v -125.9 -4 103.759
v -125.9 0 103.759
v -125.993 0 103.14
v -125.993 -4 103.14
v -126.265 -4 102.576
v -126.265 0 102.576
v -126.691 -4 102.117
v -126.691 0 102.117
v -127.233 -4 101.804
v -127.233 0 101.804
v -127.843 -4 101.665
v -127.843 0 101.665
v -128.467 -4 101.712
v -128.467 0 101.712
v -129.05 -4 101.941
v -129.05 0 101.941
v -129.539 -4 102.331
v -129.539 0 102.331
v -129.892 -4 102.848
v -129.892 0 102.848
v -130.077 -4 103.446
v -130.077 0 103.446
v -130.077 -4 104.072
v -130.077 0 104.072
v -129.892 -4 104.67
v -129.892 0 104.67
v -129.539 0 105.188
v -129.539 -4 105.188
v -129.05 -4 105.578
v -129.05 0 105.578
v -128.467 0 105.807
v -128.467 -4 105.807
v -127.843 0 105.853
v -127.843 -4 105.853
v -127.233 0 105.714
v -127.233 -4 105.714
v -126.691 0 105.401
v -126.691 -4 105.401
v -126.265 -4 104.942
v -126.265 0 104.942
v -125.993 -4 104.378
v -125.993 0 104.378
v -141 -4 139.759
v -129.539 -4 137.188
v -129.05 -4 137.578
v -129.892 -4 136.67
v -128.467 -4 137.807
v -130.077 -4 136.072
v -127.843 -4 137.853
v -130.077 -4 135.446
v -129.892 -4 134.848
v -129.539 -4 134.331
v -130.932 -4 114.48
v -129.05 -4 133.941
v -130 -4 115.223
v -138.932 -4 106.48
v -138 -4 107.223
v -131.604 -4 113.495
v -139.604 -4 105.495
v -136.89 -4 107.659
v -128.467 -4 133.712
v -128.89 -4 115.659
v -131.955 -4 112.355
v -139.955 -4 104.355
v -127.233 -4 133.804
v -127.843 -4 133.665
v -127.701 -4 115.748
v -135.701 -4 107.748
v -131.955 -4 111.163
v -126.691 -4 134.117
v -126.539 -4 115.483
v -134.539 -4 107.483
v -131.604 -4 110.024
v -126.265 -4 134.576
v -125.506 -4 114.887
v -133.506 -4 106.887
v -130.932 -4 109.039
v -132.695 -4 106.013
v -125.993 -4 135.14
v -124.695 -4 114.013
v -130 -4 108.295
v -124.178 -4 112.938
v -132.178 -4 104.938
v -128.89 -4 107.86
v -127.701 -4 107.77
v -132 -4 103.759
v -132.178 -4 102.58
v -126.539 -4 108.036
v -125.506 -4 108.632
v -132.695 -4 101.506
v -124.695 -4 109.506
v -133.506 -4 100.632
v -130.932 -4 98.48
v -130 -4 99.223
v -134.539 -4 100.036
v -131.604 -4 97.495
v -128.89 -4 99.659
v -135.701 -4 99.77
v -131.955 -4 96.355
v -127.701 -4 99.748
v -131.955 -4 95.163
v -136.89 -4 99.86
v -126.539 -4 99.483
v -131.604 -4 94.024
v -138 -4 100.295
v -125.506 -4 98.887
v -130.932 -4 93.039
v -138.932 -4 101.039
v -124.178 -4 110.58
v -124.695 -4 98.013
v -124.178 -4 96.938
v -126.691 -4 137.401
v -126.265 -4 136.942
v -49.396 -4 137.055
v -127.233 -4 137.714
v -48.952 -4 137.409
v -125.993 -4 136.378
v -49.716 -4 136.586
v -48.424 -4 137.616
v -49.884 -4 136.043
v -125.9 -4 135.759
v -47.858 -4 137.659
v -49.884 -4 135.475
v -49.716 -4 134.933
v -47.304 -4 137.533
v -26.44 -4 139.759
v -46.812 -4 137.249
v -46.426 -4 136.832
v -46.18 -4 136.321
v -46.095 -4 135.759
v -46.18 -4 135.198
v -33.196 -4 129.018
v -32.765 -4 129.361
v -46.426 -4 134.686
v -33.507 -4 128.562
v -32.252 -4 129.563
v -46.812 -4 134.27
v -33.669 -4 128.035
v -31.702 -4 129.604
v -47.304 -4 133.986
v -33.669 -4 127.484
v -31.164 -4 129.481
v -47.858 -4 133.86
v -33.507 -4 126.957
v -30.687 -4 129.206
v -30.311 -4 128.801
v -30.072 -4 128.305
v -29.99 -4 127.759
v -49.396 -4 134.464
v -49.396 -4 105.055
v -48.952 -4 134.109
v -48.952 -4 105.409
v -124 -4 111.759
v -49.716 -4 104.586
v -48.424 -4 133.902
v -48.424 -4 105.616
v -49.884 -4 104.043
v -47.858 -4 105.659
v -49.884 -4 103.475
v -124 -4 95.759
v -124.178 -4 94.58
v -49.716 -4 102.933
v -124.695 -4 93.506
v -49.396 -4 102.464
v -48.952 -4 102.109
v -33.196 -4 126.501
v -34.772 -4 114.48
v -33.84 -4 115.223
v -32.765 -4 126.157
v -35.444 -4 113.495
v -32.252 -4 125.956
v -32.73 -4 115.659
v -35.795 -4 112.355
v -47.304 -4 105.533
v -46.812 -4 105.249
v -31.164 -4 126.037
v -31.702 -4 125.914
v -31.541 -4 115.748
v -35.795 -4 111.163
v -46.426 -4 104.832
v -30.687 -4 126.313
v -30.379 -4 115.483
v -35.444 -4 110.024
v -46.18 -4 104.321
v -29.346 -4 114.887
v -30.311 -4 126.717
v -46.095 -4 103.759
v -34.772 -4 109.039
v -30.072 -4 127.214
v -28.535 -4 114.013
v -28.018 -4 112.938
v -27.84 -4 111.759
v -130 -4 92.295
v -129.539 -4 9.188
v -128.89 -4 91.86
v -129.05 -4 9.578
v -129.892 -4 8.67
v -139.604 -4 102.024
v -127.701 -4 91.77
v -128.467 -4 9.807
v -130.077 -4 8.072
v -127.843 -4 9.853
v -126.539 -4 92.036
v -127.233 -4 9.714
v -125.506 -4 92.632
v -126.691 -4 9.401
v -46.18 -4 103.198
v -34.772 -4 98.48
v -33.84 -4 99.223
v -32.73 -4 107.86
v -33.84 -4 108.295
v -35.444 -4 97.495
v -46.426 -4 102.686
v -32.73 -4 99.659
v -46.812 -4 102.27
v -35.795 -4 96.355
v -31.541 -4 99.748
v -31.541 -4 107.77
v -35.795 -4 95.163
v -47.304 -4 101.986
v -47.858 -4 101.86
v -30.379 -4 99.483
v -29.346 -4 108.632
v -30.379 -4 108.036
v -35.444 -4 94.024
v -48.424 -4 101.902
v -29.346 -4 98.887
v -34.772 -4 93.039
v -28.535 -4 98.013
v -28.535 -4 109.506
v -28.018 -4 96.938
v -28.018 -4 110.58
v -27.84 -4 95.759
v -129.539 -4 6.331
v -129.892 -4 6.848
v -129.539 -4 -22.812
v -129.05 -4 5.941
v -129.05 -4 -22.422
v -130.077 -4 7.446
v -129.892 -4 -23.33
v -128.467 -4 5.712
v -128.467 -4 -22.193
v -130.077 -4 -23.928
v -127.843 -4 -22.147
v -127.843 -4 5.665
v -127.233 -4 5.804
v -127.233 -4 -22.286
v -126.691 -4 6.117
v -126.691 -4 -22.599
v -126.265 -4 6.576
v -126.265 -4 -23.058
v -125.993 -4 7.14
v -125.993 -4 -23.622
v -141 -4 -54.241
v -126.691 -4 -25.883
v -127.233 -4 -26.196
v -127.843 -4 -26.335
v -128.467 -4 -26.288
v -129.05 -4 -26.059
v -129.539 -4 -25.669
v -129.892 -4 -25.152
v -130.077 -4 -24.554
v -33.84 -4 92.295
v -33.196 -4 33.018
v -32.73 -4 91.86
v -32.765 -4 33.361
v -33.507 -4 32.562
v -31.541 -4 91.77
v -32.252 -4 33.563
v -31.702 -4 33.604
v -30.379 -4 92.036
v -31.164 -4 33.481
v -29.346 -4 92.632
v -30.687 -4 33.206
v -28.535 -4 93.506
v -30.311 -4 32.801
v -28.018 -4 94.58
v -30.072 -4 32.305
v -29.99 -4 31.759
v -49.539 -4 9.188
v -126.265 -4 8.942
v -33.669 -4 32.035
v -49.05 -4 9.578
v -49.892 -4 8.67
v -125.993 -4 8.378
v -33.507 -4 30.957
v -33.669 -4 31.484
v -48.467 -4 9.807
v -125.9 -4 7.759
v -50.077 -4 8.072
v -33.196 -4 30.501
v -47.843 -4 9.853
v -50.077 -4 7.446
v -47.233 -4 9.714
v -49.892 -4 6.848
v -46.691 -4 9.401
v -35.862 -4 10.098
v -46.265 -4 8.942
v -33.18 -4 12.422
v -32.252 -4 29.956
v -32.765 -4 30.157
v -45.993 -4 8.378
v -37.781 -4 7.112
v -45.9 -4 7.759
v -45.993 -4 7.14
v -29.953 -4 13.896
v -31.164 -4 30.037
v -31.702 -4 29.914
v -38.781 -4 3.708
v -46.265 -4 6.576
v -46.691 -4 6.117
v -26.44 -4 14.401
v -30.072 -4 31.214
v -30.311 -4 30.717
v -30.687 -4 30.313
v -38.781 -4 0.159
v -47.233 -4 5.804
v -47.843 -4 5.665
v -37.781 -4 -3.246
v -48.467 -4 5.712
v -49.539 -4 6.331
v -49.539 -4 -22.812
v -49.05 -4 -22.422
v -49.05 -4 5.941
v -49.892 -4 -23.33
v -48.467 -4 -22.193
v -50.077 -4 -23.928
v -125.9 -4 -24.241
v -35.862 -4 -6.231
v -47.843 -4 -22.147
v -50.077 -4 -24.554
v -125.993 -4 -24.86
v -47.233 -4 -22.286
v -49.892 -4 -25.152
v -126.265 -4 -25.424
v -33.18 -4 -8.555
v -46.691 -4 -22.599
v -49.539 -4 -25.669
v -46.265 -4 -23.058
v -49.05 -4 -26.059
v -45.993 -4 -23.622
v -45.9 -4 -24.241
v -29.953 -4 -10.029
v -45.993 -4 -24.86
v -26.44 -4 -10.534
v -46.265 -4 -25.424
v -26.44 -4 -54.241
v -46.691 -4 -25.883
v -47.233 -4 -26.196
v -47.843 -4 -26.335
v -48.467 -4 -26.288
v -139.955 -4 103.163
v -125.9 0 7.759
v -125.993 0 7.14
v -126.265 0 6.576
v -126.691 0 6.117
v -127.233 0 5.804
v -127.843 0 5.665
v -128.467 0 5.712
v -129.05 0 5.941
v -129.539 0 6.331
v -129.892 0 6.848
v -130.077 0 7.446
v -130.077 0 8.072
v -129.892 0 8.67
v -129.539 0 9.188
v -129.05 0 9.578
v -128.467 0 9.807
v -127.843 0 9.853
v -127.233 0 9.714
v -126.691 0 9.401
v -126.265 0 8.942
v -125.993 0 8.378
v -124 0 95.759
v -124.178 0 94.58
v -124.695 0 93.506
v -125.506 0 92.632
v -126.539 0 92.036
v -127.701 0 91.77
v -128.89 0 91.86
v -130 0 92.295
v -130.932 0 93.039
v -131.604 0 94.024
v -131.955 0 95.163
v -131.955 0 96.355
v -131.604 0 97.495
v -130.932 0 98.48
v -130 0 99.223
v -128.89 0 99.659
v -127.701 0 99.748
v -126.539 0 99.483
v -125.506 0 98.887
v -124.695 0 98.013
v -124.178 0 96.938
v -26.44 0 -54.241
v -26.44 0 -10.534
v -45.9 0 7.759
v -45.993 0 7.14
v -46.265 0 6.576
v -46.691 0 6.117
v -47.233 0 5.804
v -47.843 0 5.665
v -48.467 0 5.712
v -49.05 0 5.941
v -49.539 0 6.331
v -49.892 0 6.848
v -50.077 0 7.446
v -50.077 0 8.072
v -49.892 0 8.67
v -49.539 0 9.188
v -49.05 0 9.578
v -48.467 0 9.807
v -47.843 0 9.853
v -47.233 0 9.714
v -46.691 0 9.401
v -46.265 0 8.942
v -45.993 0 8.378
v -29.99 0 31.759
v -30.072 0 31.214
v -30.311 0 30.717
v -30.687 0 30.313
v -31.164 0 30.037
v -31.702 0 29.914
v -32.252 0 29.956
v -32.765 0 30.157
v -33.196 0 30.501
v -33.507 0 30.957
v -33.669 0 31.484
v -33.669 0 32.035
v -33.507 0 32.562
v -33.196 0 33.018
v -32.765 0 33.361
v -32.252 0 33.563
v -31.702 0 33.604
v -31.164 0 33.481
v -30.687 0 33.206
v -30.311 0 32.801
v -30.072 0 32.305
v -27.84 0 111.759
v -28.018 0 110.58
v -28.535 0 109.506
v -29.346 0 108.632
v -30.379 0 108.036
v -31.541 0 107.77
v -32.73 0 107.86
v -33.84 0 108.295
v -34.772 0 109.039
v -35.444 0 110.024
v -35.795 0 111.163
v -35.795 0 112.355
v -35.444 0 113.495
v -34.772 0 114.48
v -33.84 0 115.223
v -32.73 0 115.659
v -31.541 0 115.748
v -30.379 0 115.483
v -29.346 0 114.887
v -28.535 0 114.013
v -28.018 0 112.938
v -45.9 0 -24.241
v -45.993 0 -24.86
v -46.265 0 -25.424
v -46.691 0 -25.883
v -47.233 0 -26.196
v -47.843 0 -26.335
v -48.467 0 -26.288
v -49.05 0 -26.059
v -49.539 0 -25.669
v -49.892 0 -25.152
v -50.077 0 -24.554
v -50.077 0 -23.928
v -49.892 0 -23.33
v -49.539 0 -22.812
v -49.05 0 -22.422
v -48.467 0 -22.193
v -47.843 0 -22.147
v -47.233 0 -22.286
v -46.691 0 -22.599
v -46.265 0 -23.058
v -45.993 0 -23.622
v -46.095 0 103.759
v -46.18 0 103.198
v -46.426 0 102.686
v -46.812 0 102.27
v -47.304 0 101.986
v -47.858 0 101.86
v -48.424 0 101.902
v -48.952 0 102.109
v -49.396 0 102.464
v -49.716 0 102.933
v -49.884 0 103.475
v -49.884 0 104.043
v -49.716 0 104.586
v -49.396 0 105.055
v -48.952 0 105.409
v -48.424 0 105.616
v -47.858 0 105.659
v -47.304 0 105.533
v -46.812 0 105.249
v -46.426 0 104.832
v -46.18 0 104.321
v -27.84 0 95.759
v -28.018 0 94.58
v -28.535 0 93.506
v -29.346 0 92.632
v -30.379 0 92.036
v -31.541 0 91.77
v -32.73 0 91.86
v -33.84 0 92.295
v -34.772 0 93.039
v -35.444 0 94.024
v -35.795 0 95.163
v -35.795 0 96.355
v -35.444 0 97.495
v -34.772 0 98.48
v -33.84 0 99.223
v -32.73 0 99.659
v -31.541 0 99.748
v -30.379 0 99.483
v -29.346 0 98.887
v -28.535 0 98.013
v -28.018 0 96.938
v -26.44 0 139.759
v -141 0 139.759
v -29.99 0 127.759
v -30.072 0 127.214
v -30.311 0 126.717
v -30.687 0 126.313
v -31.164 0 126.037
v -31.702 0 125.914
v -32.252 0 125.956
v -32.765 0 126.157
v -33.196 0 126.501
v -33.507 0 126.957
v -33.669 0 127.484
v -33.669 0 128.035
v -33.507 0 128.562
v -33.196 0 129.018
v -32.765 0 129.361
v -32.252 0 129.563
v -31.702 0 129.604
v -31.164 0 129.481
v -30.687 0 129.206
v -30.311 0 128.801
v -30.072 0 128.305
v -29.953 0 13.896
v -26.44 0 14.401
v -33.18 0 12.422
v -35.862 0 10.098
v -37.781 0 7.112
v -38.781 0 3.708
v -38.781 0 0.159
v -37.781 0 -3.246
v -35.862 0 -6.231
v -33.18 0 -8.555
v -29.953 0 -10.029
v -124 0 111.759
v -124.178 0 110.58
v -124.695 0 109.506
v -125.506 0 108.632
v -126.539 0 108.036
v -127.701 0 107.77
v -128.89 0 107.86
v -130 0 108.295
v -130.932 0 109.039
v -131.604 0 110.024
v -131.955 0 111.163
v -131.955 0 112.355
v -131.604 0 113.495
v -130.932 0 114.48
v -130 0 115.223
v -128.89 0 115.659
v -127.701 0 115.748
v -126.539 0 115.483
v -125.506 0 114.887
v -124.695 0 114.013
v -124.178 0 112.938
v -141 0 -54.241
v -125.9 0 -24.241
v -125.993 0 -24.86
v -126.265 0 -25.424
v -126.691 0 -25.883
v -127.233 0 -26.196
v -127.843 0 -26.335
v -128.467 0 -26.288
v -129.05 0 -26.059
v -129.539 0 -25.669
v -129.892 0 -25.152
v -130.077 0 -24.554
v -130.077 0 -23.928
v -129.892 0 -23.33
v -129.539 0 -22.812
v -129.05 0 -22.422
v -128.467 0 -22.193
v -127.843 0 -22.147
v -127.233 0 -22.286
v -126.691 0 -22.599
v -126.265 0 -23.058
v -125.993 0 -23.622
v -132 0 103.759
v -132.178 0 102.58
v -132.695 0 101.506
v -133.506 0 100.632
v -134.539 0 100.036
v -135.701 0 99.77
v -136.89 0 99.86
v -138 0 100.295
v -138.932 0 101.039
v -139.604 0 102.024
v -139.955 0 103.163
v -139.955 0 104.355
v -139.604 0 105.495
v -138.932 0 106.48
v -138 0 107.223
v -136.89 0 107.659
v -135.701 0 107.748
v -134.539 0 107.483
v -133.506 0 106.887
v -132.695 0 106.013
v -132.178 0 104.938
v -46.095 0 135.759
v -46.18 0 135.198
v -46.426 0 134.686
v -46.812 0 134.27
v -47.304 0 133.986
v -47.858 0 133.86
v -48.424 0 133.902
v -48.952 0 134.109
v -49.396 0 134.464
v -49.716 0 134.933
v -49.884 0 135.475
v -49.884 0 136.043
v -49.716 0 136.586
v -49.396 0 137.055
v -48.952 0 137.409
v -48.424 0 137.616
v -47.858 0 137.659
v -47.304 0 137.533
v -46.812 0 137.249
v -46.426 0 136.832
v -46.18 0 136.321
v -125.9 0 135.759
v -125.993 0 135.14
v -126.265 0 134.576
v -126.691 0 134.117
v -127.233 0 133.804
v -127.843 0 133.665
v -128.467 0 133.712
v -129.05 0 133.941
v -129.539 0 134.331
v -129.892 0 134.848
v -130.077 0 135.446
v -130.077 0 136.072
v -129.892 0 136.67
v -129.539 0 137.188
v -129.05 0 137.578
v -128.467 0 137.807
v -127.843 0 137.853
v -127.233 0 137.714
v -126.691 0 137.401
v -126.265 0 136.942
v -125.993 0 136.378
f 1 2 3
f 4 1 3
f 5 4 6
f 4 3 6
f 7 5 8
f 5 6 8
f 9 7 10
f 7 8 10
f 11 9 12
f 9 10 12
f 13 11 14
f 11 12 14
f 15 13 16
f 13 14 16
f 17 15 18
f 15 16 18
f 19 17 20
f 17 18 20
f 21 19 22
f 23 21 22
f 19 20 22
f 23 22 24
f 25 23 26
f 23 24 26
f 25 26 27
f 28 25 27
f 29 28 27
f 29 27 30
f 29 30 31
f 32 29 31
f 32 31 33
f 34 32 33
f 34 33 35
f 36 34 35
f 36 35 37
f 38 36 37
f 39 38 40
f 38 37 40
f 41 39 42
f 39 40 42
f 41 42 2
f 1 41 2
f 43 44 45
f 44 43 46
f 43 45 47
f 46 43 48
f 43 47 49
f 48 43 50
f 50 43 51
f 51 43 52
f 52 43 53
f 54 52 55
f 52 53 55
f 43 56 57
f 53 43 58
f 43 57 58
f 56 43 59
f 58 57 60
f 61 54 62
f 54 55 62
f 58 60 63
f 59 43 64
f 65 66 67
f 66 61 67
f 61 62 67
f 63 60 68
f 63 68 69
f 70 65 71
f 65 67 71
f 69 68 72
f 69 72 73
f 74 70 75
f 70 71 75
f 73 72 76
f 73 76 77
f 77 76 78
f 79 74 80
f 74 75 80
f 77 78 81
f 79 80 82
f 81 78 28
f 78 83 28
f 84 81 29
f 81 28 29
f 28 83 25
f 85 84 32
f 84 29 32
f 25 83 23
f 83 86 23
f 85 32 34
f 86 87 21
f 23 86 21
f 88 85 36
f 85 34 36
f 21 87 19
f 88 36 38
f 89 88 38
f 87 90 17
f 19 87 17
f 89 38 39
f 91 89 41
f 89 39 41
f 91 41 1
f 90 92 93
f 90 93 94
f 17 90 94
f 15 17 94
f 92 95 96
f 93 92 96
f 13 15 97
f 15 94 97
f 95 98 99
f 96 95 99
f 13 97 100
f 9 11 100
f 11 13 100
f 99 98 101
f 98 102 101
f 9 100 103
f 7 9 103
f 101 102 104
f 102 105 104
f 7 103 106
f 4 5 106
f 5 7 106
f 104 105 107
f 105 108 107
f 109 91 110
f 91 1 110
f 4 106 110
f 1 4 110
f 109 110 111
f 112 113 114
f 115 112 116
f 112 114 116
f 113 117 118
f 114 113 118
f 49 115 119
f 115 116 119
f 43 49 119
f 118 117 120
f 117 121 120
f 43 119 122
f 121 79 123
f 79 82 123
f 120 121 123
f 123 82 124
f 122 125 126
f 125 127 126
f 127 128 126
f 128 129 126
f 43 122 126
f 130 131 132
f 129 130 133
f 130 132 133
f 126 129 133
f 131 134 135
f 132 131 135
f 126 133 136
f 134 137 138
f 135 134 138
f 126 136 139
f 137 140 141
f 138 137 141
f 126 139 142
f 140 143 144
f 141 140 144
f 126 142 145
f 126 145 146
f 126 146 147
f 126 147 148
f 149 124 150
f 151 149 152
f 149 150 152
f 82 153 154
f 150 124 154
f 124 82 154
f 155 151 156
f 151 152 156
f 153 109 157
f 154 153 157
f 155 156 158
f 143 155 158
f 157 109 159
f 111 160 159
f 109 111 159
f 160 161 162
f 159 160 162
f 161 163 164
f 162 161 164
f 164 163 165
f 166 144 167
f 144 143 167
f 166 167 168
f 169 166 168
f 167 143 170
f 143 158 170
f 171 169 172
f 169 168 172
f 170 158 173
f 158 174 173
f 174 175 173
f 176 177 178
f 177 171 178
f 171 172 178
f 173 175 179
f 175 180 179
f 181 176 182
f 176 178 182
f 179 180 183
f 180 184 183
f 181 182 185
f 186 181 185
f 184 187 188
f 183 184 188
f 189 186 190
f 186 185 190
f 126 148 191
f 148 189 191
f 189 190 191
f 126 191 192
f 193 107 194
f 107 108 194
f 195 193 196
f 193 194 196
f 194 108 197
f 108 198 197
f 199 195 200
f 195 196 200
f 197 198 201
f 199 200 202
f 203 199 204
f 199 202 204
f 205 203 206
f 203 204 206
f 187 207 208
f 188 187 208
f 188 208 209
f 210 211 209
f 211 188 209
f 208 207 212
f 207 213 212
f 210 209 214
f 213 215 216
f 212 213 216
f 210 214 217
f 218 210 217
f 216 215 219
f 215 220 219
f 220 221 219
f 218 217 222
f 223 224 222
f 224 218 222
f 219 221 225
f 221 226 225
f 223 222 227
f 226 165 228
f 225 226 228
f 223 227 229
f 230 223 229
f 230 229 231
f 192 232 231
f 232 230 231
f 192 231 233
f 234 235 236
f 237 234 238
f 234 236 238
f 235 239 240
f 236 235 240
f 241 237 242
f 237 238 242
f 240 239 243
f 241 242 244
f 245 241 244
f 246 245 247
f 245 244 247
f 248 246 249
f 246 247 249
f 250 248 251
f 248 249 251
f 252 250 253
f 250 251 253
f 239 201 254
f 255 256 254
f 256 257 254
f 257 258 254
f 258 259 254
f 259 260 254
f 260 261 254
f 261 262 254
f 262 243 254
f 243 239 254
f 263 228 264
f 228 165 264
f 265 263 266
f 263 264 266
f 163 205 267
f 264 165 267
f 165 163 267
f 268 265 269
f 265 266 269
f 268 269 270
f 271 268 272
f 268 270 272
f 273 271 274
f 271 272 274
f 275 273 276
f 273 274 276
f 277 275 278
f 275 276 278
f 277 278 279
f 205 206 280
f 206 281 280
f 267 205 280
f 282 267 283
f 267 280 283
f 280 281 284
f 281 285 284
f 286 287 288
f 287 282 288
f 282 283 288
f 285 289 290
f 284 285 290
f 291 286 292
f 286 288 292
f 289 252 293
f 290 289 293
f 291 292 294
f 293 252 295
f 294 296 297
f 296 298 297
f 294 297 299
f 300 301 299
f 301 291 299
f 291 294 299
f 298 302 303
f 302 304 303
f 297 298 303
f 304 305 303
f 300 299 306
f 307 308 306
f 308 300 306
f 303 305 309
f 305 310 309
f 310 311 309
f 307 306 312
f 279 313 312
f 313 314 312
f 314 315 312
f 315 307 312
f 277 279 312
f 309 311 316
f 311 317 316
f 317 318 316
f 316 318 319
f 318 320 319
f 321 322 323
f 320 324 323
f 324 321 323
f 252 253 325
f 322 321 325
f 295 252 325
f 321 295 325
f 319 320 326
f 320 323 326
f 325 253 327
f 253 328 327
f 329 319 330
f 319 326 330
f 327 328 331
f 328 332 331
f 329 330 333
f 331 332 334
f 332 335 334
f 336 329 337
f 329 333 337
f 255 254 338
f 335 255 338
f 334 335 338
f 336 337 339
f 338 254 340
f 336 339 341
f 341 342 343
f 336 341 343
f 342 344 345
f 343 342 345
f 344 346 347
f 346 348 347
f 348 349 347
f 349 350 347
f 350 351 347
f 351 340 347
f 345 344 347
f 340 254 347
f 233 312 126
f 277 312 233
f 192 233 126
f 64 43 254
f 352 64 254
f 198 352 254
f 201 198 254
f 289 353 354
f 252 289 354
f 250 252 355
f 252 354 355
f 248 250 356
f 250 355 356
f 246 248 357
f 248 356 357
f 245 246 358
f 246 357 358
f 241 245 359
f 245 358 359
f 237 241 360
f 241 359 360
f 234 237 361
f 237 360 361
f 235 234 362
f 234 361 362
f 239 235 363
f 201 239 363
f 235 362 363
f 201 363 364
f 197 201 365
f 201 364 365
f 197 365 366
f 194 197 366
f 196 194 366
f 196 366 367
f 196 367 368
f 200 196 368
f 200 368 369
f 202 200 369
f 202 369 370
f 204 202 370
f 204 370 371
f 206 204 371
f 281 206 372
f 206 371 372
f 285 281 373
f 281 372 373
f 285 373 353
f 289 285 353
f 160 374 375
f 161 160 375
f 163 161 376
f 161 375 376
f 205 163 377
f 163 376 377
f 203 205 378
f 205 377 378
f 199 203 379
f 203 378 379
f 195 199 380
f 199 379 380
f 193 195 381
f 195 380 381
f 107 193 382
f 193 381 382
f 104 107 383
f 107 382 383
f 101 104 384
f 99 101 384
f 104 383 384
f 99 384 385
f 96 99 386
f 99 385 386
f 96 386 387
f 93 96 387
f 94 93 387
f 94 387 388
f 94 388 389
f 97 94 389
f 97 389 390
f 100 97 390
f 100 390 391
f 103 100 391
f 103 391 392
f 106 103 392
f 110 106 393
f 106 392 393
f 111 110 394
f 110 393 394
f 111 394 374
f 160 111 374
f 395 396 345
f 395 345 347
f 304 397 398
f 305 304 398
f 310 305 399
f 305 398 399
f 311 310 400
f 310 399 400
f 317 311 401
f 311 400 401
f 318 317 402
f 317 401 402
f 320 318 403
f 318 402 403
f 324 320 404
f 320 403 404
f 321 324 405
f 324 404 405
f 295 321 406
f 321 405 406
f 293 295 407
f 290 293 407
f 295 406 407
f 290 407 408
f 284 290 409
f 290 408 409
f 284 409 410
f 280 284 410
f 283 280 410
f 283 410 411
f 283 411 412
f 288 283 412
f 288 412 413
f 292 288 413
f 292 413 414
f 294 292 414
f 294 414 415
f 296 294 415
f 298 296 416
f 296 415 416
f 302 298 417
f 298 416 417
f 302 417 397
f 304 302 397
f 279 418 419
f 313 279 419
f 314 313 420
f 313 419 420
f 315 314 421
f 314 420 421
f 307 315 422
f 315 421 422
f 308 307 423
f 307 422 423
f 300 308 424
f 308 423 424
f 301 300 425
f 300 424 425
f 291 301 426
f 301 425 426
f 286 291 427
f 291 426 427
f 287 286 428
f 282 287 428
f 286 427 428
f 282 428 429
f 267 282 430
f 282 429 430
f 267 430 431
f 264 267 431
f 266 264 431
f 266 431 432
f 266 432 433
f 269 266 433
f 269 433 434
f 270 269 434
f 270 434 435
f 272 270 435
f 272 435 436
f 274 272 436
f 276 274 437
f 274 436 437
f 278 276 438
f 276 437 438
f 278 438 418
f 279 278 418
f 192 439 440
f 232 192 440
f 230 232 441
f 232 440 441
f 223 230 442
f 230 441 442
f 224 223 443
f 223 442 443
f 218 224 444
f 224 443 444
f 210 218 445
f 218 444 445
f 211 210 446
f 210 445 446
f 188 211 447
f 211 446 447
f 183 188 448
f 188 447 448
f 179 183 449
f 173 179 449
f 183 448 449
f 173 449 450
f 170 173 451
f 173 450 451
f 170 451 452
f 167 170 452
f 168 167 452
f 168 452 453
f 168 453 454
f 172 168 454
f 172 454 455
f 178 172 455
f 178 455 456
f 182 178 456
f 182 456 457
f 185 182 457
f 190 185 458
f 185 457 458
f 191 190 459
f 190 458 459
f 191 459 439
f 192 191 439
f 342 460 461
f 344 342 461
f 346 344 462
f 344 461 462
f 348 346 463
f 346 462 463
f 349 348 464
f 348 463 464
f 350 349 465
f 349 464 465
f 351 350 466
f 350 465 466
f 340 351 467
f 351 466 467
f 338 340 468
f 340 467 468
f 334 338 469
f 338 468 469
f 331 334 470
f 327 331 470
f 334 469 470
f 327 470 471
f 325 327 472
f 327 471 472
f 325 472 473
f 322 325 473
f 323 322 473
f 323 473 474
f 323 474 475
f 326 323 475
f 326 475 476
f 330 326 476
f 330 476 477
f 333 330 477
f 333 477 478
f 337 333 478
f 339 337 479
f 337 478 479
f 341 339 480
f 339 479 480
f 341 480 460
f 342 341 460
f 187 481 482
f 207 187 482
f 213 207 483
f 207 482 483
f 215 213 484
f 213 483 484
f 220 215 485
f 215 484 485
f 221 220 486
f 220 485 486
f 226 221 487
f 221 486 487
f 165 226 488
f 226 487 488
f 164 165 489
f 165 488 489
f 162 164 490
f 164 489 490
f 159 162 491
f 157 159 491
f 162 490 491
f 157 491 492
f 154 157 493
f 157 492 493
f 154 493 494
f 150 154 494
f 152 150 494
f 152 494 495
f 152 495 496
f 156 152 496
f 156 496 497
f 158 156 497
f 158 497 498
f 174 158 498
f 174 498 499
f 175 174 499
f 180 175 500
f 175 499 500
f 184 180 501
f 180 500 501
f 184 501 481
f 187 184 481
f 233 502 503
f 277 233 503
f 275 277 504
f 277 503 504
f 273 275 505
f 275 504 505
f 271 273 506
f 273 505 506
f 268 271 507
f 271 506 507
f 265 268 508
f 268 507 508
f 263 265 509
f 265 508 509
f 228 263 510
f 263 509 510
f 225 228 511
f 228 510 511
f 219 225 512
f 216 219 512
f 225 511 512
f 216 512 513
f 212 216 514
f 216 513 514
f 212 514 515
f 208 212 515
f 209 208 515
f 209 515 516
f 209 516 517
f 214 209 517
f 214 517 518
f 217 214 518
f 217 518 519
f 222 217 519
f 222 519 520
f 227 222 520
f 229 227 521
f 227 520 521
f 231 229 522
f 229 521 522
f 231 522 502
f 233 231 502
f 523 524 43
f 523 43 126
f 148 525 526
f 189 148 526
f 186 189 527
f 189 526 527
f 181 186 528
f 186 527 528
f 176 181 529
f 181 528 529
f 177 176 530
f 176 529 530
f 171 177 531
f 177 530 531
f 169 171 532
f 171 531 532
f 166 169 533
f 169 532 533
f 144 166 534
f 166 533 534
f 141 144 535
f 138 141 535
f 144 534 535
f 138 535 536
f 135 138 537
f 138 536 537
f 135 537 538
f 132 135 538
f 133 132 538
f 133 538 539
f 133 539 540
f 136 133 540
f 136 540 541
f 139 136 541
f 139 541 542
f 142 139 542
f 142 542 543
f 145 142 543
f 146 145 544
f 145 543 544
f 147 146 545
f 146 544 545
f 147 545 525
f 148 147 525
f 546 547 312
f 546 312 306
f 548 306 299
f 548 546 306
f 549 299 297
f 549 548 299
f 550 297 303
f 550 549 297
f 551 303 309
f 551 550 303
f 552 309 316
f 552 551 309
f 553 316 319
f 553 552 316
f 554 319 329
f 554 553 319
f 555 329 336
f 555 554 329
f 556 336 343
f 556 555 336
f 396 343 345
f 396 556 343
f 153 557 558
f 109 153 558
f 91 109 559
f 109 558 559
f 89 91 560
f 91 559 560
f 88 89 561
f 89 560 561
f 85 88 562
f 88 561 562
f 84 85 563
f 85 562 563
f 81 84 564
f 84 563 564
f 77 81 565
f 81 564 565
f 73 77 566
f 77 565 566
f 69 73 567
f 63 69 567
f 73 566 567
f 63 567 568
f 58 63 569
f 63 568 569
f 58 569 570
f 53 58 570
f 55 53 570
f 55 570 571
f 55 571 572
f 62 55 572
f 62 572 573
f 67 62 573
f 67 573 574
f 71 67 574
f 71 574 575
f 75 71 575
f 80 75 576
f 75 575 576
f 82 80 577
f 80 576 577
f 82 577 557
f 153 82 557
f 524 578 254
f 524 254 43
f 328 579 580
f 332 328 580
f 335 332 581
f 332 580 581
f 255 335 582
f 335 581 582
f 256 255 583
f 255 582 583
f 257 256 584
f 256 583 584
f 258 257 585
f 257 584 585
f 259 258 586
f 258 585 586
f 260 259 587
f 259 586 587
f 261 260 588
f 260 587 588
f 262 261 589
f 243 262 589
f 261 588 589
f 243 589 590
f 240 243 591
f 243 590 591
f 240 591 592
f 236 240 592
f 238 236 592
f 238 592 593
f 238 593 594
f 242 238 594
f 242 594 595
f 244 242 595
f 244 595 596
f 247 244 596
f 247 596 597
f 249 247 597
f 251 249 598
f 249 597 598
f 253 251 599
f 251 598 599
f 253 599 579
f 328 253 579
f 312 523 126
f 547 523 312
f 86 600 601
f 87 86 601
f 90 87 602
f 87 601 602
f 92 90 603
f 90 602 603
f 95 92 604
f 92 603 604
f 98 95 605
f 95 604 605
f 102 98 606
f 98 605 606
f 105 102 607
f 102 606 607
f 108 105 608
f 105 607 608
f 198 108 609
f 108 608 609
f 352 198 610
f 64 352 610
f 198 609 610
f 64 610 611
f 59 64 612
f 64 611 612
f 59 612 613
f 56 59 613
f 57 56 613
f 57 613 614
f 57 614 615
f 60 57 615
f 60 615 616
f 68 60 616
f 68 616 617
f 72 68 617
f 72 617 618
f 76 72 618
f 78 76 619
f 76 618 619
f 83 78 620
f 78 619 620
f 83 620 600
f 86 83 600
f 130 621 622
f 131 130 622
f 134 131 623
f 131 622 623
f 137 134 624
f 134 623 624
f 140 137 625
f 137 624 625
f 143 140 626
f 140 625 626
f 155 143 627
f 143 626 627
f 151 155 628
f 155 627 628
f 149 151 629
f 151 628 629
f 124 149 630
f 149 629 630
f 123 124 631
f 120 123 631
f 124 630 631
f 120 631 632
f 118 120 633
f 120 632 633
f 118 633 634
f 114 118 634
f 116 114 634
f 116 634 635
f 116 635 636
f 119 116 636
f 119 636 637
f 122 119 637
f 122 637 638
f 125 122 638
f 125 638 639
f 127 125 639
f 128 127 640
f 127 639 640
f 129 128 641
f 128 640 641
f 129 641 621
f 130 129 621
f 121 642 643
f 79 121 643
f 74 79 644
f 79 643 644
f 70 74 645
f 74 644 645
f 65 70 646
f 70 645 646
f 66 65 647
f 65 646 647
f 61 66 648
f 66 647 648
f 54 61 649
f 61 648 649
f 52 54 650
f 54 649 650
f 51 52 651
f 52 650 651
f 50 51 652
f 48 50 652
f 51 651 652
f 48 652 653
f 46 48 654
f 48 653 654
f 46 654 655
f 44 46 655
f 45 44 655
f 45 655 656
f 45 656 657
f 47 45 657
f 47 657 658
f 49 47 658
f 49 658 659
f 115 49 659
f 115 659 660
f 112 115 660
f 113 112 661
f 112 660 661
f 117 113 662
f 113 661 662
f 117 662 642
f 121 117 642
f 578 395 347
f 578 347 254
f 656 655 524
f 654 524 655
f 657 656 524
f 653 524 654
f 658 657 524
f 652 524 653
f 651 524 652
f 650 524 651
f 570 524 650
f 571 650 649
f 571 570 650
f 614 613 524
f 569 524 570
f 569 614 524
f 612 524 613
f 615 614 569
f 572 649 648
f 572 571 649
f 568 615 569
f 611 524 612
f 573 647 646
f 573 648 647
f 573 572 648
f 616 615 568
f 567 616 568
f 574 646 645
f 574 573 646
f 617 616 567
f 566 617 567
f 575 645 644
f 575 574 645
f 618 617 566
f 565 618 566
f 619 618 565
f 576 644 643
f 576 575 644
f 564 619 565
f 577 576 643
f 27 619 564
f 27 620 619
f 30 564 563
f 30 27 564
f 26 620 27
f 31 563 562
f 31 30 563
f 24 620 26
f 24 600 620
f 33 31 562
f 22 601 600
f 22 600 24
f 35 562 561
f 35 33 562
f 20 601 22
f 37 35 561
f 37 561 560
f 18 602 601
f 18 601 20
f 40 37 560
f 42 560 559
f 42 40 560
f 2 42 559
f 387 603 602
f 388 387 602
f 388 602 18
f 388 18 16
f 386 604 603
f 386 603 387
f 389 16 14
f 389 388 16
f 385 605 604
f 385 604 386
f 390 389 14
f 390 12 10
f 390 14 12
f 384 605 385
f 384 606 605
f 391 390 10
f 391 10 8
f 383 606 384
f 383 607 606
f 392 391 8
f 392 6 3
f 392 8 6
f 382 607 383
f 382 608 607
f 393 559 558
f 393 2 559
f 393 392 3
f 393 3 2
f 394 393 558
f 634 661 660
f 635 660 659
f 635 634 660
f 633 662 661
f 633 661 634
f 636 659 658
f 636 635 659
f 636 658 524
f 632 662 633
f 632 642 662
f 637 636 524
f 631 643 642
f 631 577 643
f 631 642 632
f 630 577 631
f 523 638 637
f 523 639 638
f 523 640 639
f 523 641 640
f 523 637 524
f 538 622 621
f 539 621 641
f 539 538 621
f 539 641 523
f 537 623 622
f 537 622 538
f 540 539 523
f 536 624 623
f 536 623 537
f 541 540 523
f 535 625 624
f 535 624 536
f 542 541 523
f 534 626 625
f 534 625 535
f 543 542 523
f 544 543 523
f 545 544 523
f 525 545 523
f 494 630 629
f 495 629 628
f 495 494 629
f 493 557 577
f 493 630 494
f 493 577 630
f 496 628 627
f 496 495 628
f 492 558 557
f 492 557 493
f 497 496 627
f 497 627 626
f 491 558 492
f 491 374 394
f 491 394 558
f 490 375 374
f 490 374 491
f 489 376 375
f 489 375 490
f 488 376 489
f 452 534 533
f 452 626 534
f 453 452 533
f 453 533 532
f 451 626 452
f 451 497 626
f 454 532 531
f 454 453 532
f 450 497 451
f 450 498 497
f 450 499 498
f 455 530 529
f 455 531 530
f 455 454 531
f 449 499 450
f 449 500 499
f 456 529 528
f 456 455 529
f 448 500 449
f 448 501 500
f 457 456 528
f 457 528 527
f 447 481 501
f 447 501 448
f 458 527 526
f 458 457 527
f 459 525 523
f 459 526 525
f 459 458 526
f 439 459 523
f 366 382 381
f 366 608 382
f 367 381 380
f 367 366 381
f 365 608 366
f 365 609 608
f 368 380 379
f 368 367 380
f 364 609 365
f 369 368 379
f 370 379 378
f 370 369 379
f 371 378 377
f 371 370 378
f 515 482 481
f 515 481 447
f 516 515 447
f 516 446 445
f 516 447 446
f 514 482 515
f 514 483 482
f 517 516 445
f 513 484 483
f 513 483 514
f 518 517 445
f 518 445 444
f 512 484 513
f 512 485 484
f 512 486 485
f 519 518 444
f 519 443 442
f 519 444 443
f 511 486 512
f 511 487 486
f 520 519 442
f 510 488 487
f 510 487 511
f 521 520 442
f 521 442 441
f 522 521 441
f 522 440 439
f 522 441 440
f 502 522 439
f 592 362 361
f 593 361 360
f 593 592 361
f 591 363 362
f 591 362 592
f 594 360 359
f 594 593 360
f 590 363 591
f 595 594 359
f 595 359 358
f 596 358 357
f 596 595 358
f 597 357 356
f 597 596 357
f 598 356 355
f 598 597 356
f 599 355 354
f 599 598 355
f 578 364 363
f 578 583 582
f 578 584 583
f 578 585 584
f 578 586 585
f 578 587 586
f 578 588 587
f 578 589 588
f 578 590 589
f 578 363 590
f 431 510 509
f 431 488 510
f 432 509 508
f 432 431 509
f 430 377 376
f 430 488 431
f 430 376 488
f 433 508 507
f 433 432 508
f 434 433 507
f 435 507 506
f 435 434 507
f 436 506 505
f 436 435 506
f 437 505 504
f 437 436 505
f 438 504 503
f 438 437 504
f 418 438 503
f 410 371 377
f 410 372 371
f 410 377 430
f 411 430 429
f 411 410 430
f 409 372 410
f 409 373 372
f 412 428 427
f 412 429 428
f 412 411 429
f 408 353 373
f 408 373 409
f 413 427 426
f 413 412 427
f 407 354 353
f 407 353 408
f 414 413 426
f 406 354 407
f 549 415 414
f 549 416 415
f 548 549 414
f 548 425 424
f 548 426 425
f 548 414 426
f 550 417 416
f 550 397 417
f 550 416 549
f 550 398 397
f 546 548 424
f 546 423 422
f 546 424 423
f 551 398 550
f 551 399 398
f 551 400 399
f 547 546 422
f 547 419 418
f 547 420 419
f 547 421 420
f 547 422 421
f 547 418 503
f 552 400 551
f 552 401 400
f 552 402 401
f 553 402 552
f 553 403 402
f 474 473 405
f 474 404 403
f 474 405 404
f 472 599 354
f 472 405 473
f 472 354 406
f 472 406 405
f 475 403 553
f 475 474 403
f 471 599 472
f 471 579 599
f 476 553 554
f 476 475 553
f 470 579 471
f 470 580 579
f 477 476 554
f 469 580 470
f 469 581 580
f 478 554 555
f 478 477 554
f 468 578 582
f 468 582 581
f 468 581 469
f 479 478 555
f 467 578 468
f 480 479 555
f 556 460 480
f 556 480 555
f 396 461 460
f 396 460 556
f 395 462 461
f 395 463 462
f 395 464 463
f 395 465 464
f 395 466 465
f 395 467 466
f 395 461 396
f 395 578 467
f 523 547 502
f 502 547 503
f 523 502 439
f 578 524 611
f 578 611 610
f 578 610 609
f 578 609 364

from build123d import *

# Parameters (mm, degrees)
SKETCH1_R           = 1.85
SKETCH1_R_2         = 1.905
SKETCH1_R_3         = 2.1
SKETCH1_R_4         = 4
BOSS_EXTRUDE1_DEPTH = 4


with BuildPart() as part:
    # Sketch1 → Boss-Extrude1 (new body)
    with BuildSketch(Plane(origin=(0, 0, 0), x_dir=(1, 0, 0), z_dir=(0, 1, 0))):
        with BuildLine():
            Line((-141, -139.759258716), (-26.44, -139.759258716))
            Line((-26.44, -139.759258716), (-26.44, -14.400783004))
            ThreePointArc((-26.44, -14.400783004), (-38.907528285, -1.933254719), (-26.44, 10.534273565))
            Line((-26.44, 10.534273565), (-26.44, 54.240741284))
            Line((-26.44, 54.240741284), (-141, 54.240741284))
            Line((-141, 54.240741284), (-141, -139.759258716))
        make_face()
        with Locations((-31.84, -31.759258716)):
            Circle(SKETCH1_R, mode=Mode.SUBTRACT)
        with Locations((-31.84, -127.759258716)):
            Circle(SKETCH1_R, mode=Mode.SUBTRACT)
        with Locations((-48, -135.759258716)):
            Circle(SKETCH1_R_2, mode=Mode.SUBTRACT)
        with Locations((-48, -103.759258716)):
            Circle(SKETCH1_R_2, mode=Mode.SUBTRACT)
        with Locations((-128, -135.759258716)):
            Circle(SKETCH1_R_3, mode=Mode.SUBTRACT)
        with Locations((-128, -103.759258716)):
            Circle(SKETCH1_R_3, mode=Mode.SUBTRACT)
        with Locations((-136, -103.759258716)):
            Circle(SKETCH1_R_4, mode=Mode.SUBTRACT)
        with Locations((-128, -95.759258716)):
            Circle(SKETCH1_R_4, mode=Mode.SUBTRACT)
        with Locations((-128, -111.759258716)):
            Circle(SKETCH1_R_4, mode=Mode.SUBTRACT)
        with Locations((-128, -7.759258716)):
            Circle(SKETCH1_R_3, mode=Mode.SUBTRACT)
        with Locations((-128, 24.240741284)):
            Circle(SKETCH1_R_3, mode=Mode.SUBTRACT)
        with Locations((-48, -7.759258716)):
            Circle(SKETCH1_R_3, mode=Mode.SUBTRACT)
        with Locations((-48, 24.240741284)):
            Circle(SKETCH1_R_3, mode=Mode.SUBTRACT)
        with Locations((-31.84, -111.759258716)):
            Circle(SKETCH1_R_4, mode=Mode.SUBTRACT)
        with Locations((-31.84, -95.759258716)):
            Circle(SKETCH1_R_4, mode=Mode.SUBTRACT)
    extrude(amount=-BOSS_EXTRUDE1_DEPTH)


solid = part.part
